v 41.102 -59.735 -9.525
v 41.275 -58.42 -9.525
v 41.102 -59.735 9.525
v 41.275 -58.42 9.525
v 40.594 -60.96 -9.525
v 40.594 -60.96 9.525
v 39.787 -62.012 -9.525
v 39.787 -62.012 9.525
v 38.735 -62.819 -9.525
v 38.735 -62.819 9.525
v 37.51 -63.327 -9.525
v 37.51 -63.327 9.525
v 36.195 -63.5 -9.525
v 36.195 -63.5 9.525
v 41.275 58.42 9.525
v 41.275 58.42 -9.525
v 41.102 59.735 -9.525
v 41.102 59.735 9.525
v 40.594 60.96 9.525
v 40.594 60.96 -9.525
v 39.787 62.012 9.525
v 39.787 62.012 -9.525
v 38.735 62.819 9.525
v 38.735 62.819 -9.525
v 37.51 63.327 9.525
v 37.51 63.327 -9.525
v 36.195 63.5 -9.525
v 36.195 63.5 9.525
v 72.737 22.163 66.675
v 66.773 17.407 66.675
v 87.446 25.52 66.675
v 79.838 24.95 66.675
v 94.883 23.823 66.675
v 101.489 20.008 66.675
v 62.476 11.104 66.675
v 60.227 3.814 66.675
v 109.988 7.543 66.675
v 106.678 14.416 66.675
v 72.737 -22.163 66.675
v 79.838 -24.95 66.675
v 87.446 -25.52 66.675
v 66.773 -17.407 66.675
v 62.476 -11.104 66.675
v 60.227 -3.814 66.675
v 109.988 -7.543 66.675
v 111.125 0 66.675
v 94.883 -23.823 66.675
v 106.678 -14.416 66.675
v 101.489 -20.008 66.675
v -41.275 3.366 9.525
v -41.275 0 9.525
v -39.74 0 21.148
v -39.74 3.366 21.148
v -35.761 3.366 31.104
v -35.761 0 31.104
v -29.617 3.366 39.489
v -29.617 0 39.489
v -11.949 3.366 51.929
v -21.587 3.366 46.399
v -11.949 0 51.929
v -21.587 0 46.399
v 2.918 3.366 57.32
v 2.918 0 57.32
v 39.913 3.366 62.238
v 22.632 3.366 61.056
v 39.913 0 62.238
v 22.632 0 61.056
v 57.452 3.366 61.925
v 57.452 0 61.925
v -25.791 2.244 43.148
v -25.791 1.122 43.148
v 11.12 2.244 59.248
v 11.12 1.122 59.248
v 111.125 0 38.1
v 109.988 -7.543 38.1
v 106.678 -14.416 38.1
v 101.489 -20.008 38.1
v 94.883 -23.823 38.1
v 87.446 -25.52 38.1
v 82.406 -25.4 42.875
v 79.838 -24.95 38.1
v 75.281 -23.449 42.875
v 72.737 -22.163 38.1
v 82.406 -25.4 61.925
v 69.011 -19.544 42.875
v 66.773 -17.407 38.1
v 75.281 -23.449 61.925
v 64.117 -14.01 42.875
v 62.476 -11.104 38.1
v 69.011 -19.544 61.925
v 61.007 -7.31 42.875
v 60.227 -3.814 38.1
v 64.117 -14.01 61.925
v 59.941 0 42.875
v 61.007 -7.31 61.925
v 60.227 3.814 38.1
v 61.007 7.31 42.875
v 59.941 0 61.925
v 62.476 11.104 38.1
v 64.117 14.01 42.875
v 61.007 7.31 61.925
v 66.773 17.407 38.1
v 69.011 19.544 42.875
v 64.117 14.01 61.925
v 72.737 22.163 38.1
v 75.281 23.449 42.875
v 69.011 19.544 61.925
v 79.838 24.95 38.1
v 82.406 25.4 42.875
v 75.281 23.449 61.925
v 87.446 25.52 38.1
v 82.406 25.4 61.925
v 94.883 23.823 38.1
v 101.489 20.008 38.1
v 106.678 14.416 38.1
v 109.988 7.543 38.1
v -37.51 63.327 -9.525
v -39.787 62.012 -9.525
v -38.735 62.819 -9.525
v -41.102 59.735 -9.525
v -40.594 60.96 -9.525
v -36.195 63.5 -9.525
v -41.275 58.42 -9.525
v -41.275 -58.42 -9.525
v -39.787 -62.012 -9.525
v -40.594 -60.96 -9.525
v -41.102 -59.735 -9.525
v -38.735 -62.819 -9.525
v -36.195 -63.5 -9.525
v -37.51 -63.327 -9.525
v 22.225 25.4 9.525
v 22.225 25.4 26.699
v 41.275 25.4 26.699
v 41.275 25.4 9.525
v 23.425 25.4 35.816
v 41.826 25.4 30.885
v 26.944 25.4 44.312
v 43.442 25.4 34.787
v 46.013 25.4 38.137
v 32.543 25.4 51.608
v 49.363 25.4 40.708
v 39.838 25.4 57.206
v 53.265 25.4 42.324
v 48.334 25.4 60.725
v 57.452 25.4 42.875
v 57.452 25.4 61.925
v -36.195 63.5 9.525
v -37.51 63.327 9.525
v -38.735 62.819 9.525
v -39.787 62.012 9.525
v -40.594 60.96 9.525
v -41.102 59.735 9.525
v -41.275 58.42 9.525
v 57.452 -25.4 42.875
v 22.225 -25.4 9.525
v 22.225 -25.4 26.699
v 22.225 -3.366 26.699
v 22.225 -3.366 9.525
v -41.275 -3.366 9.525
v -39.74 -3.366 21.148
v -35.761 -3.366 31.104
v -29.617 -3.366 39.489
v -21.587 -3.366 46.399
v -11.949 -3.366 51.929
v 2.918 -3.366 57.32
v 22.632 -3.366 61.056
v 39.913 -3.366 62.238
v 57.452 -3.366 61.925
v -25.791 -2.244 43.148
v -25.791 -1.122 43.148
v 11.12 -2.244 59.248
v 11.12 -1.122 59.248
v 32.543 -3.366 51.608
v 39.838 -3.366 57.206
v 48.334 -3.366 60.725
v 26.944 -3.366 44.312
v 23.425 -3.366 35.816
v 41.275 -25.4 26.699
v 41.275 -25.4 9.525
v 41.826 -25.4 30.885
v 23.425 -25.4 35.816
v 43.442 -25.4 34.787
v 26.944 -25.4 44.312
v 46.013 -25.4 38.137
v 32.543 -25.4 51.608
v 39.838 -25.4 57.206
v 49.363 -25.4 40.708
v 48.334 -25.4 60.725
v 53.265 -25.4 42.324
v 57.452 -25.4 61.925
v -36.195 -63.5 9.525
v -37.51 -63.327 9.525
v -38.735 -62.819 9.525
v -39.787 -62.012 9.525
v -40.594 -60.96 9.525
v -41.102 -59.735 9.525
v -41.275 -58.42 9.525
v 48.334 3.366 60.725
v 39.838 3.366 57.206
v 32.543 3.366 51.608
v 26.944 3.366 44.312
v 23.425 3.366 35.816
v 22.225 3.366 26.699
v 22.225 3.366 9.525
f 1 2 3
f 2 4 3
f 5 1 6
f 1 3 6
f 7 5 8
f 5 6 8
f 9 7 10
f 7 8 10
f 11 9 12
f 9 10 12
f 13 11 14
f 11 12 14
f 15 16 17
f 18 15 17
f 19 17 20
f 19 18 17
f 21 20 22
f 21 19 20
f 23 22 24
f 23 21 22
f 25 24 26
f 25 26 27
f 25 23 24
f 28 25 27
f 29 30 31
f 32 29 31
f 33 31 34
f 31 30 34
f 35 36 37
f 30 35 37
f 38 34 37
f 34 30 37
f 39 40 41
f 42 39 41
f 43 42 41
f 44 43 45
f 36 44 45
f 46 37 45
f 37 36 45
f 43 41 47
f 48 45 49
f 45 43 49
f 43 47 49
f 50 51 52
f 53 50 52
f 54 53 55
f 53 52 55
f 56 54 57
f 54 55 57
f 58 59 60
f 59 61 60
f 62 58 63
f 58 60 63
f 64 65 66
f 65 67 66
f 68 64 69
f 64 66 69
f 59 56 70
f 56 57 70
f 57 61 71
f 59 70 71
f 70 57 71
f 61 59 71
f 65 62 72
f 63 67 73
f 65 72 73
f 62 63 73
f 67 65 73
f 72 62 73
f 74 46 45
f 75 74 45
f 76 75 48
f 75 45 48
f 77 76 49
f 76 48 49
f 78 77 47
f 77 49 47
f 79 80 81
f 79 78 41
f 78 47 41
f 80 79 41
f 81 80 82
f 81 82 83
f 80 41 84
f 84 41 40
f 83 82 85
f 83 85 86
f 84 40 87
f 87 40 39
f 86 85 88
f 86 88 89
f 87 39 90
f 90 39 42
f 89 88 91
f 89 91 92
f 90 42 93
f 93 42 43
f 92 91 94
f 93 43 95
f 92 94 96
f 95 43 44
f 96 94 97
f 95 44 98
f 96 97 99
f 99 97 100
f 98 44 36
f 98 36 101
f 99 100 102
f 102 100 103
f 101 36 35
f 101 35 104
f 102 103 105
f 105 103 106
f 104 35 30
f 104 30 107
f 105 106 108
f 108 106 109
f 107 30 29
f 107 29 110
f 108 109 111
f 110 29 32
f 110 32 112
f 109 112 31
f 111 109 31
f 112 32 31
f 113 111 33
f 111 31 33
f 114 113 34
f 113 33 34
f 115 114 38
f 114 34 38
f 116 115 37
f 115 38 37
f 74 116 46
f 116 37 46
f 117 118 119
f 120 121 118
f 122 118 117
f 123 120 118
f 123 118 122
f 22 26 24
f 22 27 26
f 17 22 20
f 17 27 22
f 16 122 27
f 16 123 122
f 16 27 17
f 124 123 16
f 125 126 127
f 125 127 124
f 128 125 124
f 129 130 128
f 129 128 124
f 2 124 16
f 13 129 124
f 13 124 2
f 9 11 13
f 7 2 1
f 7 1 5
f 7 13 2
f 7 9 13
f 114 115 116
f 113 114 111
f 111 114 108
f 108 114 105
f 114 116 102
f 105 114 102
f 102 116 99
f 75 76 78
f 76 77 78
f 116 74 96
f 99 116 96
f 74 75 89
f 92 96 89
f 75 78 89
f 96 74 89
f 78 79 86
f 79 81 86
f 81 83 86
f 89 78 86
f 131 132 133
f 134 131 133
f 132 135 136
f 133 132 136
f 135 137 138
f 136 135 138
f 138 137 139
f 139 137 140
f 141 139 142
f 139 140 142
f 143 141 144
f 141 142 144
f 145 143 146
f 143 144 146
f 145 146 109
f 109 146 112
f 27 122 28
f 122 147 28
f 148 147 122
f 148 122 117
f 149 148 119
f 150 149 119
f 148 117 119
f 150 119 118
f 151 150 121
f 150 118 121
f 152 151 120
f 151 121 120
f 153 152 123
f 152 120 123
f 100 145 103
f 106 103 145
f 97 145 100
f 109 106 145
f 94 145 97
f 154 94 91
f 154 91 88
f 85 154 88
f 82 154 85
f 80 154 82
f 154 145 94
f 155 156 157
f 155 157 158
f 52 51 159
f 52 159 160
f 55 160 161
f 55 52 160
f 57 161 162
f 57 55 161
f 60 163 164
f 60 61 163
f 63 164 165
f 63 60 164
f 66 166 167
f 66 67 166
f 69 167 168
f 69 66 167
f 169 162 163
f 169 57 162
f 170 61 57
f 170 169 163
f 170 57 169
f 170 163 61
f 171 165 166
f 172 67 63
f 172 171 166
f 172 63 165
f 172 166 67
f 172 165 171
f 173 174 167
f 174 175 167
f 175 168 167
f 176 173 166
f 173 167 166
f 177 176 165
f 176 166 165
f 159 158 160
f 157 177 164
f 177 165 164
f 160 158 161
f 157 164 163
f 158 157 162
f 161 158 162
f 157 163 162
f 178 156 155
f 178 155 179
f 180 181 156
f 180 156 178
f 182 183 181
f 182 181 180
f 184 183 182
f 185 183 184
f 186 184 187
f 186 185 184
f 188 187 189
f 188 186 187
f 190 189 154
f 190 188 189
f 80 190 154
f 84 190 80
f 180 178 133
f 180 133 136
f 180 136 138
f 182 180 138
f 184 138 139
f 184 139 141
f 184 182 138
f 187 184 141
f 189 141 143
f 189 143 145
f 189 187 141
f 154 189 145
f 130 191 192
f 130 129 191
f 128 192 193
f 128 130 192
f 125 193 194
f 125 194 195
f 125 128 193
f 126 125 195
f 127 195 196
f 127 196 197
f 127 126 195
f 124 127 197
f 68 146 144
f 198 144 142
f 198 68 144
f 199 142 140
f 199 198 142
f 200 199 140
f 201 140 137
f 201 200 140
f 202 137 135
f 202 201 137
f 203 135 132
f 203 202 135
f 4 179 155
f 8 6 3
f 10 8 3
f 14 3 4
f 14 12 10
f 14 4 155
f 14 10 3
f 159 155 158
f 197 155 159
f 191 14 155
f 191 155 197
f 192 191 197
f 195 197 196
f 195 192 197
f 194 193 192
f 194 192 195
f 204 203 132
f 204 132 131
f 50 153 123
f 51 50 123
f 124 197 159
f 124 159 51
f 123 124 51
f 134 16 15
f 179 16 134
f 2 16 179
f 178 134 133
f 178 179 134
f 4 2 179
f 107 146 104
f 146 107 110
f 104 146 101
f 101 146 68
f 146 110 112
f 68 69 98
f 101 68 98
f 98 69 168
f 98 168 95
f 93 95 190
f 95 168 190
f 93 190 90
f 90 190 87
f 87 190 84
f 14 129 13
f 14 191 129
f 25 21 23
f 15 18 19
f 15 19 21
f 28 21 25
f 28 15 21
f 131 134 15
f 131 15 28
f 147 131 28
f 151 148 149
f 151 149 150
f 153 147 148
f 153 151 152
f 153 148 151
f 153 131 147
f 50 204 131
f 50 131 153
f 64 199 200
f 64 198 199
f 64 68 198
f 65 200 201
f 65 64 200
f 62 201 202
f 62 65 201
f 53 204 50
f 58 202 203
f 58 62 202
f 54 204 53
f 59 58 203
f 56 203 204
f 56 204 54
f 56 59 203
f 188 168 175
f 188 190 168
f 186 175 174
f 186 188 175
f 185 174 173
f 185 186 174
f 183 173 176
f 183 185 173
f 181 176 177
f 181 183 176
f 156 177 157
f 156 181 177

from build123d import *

# Parameters (mm, degrees)
F1_DEPTH = 63.5
F2_DEPTH = 25.4
F3_DEPTH = 3.3655
F0_W     = 25.2081867933
F0_H     = 19.05
F4_DEPTH = 25.4
F6_R     = 5.08


# Not quite as in the source:
# - a feature names something its author has since deleted; it is built from what else it names


with BuildPart() as f1:
    # F0 (on Front) → F1 (new body, symmetric)
    with BuildSketch(Plane.XZ):
        Polygon((-41.275, -9.525), (41.275, -9.525), (41.275, 9.525), (22.225, 9.525), (-41.275, 9.525), align=None)
    extrude(amount=F1_DEPTH, both=True)

    # F0 (on Front) → F2 (join, symmetric)
    with BuildSketch(Plane.XZ):
        with BuildLine():
            Line((22.225, 9.525), (41.275, 9.525))
            Line((41.275, 9.525), (41.275, 26.6985158606))
            ThreePointArc((41.275, 26.6985158606), (46.0130410873, 38.1371589127), (57.4516841394, 42.8752))
            Line((57.4516841394, 42.8752), (60.325, 42.8752))
            Line((60.325, 42.8752), (60.325, 61.9252))
            Line((60.325, 61.9252), (57.4516841394, 61.9252))
            ThreePointArc((57.4516841394, 61.9252), (32.5426569057, 51.6075430943), (22.225, 26.6985158606))
            Line((22.225, 26.6985158606), (22.225, 9.525))
        make_face()
    extrude(amount=F2_DEPTH, both=True)

    # F0 (on Front) → F3 (join, symmetric)
    with BuildSketch(Plane.XZ):
        with BuildLine():
            add(Edge.make_bspline(
                [(-41.275, 9.525), (-40.5068695545, 53.2762855291), (10.412055999, 64.5915940404), (57.4516841394, 61.9252)],
                knots=[0, 0, 0, 0, 111.7709225211, 111.7709225211, 111.7709225211, 111.7709225211], degree=3))
            Line((-41.275, 9.525), (22.225, 9.525))
            Line((22.225, 9.525), (22.225, 26.6985158606))
            ThreePointArc((22.225, 26.6985158606), (32.5426569057, 51.6075430943), (57.4516841394, 61.9252))
        make_face()
    extrude(amount=F3_DEPTH, both=True)

    # F0 (on Front) → F4 (join, symmetric)
    with BuildSketch(Plane.XZ):
        with Locations((72.9290933967, 52.4002)):
            Rectangle(F0_W, F0_H)
    extrude(amount=F4_DEPTH, both=True)

    # F0 (on Front) → F5 (revolve)
    with BuildSketch(Plane.XZ):
        Polygon((85.5331867933, 66.675), (85.5331867933, 61.9252), (85.5331867933, 42.8752), (85.5331867933, 38.1), (111.125, 38.1), (111.125, 66.675), align=None)
    revolve(axis=Axis((85.5331867933, 0, 52.3875), (0, 0, -1)))

    # F6
    f6_edges = [f1.edges().sort_by_distance(p)[0] for p in [
        (41.275, -63.5, 0),
        (-41.275, -63.5, 0),
        (41.275, 63.5, 0),
        (-41.275, 63.5, 0),
    ]]
    fillet(f6_edges, radius=F6_R)


solid = f1.part
